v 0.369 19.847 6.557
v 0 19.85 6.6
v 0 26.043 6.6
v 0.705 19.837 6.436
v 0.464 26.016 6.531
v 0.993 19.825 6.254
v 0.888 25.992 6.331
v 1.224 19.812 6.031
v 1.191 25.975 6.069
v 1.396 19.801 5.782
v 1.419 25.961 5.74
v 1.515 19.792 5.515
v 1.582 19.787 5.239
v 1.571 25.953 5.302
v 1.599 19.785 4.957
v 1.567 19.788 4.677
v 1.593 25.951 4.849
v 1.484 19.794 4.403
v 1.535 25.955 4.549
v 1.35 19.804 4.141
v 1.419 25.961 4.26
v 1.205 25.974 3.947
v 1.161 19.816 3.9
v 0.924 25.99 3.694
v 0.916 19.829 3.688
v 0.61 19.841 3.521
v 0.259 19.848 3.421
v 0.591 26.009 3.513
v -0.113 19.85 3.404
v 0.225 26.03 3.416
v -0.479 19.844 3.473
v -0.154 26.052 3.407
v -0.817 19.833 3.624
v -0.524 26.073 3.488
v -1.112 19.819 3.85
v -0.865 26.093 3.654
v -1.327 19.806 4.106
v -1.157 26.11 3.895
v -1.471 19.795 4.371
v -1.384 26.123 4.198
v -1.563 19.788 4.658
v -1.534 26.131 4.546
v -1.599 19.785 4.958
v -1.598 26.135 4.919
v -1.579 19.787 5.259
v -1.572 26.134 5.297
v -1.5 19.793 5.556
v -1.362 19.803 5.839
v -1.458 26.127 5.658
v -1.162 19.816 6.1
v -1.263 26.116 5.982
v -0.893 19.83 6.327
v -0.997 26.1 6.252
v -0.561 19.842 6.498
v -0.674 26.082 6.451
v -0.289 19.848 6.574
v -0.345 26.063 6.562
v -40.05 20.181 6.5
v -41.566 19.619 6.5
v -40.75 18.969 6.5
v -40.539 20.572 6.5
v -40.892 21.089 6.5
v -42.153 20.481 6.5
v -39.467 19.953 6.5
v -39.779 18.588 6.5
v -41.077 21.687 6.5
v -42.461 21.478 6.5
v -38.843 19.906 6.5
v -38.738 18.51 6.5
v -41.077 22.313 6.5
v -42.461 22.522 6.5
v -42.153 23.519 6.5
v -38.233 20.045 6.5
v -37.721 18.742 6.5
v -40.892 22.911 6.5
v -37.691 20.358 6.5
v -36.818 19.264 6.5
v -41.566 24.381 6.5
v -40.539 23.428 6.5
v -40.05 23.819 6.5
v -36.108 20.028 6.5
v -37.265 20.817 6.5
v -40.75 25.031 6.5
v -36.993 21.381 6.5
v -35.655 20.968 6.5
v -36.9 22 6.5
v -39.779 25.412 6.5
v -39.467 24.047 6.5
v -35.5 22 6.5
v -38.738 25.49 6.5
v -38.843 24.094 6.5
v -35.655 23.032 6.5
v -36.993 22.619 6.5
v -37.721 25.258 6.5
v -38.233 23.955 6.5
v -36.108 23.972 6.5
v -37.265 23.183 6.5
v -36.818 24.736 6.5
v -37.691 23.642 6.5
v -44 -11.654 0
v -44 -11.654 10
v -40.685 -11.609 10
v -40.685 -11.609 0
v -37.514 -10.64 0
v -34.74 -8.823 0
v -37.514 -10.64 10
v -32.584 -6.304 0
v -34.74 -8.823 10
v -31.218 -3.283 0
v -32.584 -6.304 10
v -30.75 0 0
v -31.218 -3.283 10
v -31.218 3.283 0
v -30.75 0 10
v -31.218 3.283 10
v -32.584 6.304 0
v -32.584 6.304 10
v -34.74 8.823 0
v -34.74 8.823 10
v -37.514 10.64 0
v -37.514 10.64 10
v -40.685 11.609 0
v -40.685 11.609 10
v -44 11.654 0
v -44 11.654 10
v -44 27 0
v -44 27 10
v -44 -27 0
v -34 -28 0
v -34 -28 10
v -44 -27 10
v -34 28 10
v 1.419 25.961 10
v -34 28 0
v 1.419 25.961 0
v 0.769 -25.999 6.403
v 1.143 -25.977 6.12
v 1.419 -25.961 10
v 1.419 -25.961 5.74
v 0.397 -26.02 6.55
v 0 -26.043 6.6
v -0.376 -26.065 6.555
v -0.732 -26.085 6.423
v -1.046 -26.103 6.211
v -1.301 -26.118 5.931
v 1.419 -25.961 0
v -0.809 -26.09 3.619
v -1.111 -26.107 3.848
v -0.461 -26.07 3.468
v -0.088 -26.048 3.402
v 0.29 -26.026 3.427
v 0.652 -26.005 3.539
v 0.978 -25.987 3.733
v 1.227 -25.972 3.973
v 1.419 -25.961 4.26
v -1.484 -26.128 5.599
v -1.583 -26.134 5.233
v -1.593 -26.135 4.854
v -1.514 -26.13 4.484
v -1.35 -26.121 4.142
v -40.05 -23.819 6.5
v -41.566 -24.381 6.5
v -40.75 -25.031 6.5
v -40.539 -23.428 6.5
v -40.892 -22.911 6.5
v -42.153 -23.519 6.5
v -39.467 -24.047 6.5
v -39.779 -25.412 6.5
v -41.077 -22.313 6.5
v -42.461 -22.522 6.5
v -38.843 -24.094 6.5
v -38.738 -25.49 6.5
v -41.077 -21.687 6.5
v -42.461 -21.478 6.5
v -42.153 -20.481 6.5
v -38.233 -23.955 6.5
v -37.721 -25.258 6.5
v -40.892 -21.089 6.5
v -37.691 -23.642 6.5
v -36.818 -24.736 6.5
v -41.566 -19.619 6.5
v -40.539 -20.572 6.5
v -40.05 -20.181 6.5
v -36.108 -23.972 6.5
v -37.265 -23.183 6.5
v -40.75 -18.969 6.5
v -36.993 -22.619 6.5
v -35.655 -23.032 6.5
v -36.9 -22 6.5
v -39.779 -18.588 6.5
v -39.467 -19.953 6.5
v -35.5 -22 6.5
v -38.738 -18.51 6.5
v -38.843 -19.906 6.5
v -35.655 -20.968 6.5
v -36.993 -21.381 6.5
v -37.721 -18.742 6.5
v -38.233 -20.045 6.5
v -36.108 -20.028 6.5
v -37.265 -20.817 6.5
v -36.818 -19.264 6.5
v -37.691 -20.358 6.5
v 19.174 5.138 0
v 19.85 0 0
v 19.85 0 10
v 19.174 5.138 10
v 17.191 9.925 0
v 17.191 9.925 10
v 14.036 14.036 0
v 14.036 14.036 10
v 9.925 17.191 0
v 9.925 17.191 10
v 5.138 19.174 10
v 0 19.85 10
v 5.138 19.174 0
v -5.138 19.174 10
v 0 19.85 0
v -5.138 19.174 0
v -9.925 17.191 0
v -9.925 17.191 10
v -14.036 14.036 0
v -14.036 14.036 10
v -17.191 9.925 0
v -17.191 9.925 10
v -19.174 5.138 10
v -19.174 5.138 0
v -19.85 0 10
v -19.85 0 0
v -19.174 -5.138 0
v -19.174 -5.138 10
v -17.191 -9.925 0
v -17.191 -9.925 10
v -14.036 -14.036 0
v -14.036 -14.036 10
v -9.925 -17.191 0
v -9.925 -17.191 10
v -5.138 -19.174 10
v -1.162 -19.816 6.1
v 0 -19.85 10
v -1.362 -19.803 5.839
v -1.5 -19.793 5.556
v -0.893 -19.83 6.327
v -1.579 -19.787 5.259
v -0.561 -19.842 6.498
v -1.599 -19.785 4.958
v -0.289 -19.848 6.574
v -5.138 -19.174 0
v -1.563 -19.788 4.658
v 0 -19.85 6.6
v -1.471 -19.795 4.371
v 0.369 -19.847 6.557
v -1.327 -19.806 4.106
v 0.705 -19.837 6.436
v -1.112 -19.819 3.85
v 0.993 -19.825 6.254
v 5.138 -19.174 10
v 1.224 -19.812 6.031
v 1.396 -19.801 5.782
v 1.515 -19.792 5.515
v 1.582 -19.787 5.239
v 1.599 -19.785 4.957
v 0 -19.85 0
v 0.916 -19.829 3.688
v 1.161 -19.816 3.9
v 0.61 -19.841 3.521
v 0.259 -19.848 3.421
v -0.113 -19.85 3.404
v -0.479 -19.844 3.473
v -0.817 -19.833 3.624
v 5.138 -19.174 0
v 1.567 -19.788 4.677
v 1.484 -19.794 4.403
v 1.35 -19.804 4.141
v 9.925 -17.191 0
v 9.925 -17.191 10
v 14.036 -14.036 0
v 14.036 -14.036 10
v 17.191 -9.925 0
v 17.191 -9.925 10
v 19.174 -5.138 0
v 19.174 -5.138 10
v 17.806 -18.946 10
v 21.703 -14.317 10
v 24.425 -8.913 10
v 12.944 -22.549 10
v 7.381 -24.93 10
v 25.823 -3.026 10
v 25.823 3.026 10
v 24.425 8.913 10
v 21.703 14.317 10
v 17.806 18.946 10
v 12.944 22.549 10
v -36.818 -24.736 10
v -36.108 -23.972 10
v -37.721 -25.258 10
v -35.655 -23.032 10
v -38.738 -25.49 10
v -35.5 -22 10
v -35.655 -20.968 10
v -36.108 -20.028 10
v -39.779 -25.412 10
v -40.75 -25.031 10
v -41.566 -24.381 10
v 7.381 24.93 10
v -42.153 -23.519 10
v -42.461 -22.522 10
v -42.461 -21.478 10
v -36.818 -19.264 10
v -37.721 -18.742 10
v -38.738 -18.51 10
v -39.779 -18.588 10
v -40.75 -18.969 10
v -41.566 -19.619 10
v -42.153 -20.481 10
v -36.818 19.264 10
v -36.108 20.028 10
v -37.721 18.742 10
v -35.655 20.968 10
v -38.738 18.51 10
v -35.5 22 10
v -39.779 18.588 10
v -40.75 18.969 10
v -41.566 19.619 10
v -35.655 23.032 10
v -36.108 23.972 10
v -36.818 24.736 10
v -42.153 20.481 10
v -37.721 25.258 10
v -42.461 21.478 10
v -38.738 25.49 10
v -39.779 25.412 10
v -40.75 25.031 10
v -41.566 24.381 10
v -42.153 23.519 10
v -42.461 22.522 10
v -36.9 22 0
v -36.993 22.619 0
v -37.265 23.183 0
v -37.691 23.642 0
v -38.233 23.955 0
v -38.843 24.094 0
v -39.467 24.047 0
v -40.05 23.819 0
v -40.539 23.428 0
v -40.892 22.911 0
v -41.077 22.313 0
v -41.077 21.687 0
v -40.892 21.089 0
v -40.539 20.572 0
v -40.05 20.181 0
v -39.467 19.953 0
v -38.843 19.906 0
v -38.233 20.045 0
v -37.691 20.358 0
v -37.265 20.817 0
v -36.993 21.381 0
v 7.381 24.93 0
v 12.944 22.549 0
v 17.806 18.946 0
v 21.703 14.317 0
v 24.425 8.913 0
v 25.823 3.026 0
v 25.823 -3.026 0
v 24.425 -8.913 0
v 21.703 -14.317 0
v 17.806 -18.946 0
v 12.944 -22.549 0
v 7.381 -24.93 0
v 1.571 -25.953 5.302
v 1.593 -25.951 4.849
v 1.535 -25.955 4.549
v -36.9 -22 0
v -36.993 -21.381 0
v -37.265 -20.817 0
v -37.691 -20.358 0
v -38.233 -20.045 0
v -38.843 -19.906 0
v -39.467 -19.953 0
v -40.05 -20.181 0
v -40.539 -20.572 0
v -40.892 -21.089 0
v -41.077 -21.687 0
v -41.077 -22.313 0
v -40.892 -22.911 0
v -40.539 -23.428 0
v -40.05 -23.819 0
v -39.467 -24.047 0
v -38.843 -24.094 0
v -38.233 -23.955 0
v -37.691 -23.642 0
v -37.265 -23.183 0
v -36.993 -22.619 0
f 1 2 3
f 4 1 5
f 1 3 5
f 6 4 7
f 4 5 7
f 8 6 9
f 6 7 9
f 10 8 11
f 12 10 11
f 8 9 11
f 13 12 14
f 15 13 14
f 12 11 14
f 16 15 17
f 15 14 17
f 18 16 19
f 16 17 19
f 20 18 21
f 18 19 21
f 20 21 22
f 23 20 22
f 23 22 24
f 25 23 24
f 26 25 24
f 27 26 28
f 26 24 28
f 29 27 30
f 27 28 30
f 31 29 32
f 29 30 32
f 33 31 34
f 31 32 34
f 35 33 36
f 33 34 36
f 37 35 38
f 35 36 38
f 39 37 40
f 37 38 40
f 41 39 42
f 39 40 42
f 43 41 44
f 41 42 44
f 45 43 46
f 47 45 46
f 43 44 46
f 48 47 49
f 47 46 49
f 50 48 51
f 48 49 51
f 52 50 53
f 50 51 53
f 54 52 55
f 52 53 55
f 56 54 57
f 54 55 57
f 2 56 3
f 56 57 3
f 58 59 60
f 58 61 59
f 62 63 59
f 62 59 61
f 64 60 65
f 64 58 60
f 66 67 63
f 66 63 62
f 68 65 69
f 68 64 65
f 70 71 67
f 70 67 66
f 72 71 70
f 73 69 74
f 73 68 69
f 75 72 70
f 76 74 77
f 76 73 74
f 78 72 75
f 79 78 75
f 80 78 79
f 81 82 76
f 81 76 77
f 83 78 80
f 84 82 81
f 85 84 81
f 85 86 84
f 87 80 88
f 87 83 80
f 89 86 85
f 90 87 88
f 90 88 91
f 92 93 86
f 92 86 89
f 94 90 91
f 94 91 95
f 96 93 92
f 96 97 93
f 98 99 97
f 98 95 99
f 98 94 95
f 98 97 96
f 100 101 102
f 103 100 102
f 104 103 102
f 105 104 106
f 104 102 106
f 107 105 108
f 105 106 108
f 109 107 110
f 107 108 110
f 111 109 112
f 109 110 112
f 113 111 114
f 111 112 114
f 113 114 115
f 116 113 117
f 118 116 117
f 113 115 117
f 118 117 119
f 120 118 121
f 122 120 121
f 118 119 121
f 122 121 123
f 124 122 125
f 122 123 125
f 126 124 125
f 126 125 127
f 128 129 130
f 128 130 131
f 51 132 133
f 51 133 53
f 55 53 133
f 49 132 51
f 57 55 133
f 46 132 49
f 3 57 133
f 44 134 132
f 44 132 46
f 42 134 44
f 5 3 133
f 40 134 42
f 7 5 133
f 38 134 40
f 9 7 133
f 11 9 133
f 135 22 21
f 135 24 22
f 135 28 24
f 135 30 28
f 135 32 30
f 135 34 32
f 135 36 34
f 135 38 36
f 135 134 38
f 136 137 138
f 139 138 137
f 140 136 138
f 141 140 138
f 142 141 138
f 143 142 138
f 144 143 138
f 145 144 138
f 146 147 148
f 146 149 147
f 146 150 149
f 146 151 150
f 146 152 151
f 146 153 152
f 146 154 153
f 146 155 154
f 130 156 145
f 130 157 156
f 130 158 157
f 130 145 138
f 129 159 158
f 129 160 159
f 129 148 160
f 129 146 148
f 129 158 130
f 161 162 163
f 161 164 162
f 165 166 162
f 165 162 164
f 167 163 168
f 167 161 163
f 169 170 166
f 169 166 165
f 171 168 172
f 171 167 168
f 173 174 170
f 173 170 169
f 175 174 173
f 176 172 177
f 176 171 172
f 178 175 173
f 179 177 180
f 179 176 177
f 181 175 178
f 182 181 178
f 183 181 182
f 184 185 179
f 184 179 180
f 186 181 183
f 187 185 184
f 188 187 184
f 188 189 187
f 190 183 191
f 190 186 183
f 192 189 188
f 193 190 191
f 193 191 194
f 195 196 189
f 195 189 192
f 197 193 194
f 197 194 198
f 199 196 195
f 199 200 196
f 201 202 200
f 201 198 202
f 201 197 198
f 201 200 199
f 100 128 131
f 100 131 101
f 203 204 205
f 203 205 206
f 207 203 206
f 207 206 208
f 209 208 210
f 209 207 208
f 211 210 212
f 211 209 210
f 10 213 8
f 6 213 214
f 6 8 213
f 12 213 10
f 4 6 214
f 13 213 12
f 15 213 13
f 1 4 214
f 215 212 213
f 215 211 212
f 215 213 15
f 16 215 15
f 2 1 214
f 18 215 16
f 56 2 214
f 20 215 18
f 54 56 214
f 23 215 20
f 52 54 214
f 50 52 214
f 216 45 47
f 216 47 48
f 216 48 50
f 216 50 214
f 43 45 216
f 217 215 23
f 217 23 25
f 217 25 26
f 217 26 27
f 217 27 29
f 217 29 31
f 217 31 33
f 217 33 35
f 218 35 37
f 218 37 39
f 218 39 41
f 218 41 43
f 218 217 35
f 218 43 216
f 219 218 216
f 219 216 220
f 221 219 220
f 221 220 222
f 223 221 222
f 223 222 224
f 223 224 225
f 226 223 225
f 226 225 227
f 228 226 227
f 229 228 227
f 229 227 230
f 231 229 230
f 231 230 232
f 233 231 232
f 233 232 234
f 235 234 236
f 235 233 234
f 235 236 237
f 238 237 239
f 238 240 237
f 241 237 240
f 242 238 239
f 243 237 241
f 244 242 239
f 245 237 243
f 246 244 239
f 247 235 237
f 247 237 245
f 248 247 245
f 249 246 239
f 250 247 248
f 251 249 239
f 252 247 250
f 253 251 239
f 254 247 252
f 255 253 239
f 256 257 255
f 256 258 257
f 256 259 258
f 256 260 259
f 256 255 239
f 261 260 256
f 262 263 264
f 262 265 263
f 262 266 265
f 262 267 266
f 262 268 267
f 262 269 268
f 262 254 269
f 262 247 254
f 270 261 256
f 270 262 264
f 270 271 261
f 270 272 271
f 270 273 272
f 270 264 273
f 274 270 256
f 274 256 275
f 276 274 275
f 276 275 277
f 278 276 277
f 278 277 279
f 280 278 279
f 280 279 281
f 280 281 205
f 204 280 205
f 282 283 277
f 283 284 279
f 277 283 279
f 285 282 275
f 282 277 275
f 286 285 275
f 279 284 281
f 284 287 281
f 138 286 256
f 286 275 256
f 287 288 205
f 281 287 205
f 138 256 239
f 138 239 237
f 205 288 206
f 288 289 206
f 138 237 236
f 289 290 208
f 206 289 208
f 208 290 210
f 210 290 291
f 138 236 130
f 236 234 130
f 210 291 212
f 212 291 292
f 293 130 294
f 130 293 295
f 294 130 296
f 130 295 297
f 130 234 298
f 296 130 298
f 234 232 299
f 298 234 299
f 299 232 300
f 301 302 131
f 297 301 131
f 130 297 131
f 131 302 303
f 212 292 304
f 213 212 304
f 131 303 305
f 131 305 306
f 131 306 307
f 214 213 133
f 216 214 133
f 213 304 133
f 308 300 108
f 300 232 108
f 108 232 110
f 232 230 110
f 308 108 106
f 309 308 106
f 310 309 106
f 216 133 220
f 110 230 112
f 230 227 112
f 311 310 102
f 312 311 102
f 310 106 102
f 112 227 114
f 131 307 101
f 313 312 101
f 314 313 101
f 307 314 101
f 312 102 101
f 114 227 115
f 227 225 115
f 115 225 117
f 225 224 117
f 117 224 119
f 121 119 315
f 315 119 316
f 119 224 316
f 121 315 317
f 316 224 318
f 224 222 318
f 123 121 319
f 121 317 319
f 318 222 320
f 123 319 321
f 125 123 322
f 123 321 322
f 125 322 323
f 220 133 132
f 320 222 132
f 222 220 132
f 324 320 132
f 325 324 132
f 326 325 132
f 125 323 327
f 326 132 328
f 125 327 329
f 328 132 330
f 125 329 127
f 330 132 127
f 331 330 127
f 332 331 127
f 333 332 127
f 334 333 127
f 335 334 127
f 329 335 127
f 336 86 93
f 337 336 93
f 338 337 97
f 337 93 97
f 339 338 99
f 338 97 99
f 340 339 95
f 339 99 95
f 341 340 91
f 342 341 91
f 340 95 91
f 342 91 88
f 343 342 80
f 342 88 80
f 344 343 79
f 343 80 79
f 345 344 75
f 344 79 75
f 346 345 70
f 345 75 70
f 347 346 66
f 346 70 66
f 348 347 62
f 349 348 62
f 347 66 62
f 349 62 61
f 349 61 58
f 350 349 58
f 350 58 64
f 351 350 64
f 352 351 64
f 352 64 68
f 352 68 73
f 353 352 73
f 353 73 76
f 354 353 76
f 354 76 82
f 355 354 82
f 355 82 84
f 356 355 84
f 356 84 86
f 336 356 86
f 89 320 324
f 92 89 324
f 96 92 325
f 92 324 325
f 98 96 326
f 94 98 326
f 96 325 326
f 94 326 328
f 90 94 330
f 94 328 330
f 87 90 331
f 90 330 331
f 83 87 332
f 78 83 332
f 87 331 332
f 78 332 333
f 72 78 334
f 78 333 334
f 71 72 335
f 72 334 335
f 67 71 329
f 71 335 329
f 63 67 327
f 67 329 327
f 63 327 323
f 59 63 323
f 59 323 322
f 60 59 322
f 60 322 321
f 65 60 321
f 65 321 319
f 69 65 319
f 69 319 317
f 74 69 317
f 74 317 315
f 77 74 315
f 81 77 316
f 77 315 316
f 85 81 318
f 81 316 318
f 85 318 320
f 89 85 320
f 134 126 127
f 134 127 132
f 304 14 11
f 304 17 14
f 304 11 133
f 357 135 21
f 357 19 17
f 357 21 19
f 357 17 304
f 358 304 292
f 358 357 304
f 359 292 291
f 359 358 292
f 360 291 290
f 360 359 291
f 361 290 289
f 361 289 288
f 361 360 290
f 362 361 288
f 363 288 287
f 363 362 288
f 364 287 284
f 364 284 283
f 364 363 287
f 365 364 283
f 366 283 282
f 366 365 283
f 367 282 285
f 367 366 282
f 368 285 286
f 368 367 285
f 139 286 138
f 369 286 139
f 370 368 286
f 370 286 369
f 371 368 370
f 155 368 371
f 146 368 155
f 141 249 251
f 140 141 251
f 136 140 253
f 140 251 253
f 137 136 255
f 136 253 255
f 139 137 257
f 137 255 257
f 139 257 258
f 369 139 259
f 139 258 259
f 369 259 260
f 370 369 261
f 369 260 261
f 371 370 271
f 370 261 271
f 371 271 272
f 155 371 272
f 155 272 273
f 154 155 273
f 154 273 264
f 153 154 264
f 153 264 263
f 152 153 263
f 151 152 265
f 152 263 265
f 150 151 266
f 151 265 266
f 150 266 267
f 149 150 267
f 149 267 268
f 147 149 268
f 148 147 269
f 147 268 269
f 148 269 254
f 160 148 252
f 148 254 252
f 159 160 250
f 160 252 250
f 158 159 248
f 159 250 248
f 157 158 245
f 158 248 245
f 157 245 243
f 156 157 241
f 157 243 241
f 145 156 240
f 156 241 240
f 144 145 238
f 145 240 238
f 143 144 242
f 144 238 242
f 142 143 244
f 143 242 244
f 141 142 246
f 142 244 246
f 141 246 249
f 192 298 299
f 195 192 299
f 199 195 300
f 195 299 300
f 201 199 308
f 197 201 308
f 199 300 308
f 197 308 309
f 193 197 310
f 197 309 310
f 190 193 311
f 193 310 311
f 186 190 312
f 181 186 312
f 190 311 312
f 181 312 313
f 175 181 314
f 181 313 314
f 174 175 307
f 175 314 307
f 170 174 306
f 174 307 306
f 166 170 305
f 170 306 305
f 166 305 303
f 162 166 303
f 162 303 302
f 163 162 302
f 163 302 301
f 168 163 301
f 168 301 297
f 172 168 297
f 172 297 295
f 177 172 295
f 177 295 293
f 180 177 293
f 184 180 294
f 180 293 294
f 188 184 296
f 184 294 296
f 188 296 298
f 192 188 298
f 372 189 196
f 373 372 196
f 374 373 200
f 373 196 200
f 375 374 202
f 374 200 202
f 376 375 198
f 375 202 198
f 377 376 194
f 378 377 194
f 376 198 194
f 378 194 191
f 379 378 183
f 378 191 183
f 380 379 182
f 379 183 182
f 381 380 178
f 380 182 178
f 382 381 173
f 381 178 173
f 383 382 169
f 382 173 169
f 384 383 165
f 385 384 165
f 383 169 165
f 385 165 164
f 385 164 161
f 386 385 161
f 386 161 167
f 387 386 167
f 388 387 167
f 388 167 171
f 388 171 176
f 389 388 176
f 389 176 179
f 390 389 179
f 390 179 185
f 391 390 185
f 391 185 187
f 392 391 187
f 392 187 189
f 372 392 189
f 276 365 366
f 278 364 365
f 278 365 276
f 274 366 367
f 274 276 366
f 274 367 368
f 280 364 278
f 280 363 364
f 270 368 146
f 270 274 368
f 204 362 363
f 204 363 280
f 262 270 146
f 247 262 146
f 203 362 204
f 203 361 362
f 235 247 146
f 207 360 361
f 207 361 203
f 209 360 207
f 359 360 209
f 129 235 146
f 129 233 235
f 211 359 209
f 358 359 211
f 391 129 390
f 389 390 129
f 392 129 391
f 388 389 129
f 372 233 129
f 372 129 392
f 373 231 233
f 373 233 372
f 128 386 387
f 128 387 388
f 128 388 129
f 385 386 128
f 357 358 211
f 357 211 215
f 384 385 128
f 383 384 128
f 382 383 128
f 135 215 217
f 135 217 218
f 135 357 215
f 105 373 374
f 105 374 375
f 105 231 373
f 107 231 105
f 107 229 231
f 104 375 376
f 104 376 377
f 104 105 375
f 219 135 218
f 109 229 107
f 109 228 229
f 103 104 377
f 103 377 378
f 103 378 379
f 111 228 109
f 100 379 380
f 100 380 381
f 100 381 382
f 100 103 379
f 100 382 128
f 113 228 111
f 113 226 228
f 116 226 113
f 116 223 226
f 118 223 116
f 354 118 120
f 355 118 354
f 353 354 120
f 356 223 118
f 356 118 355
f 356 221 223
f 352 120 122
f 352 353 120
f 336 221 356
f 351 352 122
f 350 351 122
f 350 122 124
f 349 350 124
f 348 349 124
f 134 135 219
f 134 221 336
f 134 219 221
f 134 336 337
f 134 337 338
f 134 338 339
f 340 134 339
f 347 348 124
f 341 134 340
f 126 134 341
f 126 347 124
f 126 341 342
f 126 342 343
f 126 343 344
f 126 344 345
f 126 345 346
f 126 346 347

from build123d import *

# Parameters (mm, degrees)
SKETCH1_R           = 19.85
BOSS_EXTRUDE1_DEPTH = 10
SKETCH2_R           = 11.75
CUT_EXTRUDE1_DEPTH  = 10
SKETCH3_R           = 1.6
CUT_EXTRUDE2_DEPTH  = 27
SKETCH4_R           = 2.1
CUT_EXTRUDE3_DEPTH  = 10
SKETCH5_R           = 3.5
CUT_EXTRUDE4_DEPTH  = 3.5


with BuildPart() as part:
    # Sketch1 → Boss-Extrude1 (new body)
    with BuildSketch(Plane.XY):
        with BuildLine():
            Line((-34, 28), (1.418583132, 25.961381575))
            ThreePointArc((1.418583132, 25.961381575), (26.000109834, 0), (1.418583132, -25.961381575))
            Line((1.418583132, -25.961381575), (-34, -28))
            Line((-34, -28), (-44, -27))
            Line((-44, -27), (-44, 27))
            Line((-44, 27), (-34, 28))
        make_face()
        Circle(SKETCH1_R, mode=Mode.SUBTRACT)
    extrude(amount=BOSS_EXTRUDE1_DEPTH)

    # Sketch2 → Cut-Extrude1 (cut)
    with BuildSketch(Plane.XY.offset(10)):
        with Locations((-42.5, 0)):
            Circle(SKETCH2_R)
    extrude(amount=-CUT_EXTRUDE1_DEPTH, mode=Mode.SUBTRACT)

    # Sketch3 → Cut-Extrude2 (cut, symmetric)
    with BuildSketch(Plane(origin=(0, 0, 0), x_dir=(1, 0, 0), z_dir=(0, 1, 0))):
        with Locations(Location((0, -5, 0), (0, 0, 270))):
            Circle(SKETCH3_R)
    extrude(amount=CUT_EXTRUDE2_DEPTH, both=True, mode=Mode.SUBTRACT)

    # Sketch4 → Cut-Extrude3 (cut)
    with BuildSketch(Plane.XY.offset(10)):
        with Locations((-39, 22)):
            Circle(SKETCH4_R)
        with Locations((-39, -22)):
            Circle(SKETCH4_R)
    extrude(amount=-CUT_EXTRUDE3_DEPTH, mode=Mode.SUBTRACT)

    # Sketch5 → Cut-Extrude4 (cut)
    with BuildSketch(Plane.XY.offset(10)):
        with Locations((-39, 22)):
            Circle(SKETCH5_R)
        with Locations((-39, -22)):
            Circle(SKETCH5_R)
    extrude(amount=-CUT_EXTRUDE4_DEPTH, mode=Mode.SUBTRACT)


solid = part.part
